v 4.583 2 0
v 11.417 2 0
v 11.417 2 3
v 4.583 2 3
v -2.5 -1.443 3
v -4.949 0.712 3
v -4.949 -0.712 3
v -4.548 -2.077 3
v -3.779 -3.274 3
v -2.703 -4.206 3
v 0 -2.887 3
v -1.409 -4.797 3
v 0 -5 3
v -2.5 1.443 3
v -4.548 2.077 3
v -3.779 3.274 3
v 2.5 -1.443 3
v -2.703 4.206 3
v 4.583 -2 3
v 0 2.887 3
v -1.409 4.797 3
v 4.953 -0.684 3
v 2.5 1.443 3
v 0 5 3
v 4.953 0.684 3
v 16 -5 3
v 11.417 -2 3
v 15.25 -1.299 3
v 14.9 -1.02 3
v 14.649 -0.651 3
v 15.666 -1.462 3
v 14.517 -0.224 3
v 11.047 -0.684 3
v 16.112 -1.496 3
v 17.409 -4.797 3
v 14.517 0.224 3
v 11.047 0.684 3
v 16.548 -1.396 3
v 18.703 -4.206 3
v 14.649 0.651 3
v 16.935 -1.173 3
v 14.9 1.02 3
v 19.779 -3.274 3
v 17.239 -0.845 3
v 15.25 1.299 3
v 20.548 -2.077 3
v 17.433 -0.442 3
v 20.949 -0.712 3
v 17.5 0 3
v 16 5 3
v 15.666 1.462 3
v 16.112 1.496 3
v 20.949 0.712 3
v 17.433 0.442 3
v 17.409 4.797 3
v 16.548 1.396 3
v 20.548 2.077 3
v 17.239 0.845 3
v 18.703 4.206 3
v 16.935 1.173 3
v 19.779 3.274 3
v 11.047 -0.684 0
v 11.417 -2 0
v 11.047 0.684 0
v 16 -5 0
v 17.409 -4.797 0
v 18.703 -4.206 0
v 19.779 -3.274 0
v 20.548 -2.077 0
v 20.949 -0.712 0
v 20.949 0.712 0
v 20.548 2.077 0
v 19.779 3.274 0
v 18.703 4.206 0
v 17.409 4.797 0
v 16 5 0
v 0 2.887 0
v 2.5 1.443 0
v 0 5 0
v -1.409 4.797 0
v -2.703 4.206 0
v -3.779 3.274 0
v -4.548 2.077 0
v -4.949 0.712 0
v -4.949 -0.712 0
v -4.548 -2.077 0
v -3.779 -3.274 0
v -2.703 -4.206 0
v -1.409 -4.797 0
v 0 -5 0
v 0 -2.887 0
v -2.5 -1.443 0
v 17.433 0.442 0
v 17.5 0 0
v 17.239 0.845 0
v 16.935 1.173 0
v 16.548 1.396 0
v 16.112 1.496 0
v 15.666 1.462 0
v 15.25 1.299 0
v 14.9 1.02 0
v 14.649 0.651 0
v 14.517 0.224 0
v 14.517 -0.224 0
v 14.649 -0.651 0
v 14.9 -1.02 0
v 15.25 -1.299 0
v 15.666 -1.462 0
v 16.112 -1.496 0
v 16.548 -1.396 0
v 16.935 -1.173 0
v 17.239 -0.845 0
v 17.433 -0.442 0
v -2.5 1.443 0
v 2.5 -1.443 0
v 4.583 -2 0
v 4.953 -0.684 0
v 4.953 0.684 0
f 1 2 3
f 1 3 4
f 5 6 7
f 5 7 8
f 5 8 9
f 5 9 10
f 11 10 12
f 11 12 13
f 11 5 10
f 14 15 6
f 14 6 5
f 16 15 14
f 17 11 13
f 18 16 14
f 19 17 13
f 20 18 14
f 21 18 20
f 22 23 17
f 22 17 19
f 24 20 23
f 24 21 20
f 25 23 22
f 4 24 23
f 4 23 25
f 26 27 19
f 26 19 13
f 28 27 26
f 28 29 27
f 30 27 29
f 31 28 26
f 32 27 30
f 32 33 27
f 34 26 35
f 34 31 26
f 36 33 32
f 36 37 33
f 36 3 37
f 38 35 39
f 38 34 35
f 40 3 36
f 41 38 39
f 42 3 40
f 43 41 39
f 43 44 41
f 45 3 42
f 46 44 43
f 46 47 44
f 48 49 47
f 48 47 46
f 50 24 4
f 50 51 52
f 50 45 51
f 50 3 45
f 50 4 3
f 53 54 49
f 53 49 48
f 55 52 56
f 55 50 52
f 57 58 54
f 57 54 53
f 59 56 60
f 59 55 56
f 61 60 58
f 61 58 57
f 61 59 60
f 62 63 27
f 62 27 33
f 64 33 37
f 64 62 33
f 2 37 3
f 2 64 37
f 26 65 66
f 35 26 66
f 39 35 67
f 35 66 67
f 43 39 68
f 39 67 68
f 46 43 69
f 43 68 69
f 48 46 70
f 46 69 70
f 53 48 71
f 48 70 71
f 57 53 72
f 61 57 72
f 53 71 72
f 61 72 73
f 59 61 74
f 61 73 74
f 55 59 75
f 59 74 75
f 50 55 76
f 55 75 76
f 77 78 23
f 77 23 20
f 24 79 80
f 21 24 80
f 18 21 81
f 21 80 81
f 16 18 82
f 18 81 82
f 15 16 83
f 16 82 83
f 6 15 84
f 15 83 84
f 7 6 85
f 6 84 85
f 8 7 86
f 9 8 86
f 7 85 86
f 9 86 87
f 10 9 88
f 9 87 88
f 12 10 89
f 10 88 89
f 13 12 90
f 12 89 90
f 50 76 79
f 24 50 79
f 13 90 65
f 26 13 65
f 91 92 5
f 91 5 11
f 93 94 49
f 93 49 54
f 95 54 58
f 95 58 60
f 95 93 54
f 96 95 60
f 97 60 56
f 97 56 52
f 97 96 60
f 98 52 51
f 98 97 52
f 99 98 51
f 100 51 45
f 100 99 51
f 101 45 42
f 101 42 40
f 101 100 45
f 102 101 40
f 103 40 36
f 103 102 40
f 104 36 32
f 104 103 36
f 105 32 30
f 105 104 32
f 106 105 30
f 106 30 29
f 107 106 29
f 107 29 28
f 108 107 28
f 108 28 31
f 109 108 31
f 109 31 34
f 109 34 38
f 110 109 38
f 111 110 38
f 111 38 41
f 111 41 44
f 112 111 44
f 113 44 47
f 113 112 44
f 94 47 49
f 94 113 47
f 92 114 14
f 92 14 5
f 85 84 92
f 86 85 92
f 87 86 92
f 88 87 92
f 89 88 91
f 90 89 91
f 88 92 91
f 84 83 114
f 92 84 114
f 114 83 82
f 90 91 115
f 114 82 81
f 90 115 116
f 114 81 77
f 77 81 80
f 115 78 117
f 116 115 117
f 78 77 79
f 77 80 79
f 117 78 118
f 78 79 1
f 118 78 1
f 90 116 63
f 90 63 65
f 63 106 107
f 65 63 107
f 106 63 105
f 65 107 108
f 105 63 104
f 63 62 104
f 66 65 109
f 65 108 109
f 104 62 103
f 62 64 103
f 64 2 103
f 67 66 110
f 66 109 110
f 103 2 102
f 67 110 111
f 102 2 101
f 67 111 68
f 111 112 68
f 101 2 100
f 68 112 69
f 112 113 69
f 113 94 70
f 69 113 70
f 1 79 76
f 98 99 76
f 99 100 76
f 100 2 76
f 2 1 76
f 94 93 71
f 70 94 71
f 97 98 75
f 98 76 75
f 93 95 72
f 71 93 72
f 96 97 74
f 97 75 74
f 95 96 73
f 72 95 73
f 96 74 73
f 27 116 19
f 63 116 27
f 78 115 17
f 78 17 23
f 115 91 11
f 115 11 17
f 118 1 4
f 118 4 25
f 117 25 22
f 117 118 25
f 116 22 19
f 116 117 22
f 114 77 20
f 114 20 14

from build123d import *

# Parameters (mm, degrees)
SKETCH1_R          = 1.5
EXTRUDE1_DEPTH     = 3
CUT_EXTRUDE1_START = -10
SKETCH2_R          = 1.5
CUT_EXTRUDE1_DEPTH = 10


with BuildPart() as part:
    # Sketch1 → Extrude1 (new body)
    with BuildSketch(Plane.XY):
        with BuildLine():
            Line((0, -5), (16, -5))
            ThreePointArc((16, -5), (21, 0), (16, 5))
            Line((16, 5), (0, 5))
            ThreePointArc((0, 5), (-5, 0), (0, -5))
        make_face()
        with Locations((16, 0)):
            Circle(SKETCH1_R, mode=Mode.SUBTRACT)
        Circle(SKETCH1_R, mode=Mode.SUBTRACT)
    extrude(amount=EXTRUDE1_DEPTH)

    # Sketch2 → Cut-Extrude1 (cut)
    with BuildSketch(Plane.XY.offset(3).offset(CUT_EXTRUDE1_START)):
        with Locations((16, 0)):
            Circle(SKETCH2_R)
        Polygon((0, 2.886751346), (-2.5, 1.443375673), (-2.5, -1.443375673), (0, -2.886751346), (2.5, -1.443375673), (2.5, 1.443375673), align=None)
        with BuildLine():
            Line((4.582575695, -2), (11.417424305, -2))
            ThreePointArc((11.417424305, -2), (11, 0), (11.417424305, 2))
            Line((11.417424305, 2), (4.582575695, 2))
            ThreePointArc((4.582575695, 2), (5, 0), (4.582575695, -2))
        make_face()
    extrude(amount=CUT_EXTRUDE1_DEPTH, mode=Mode.SUBTRACT)


solid = part.part
